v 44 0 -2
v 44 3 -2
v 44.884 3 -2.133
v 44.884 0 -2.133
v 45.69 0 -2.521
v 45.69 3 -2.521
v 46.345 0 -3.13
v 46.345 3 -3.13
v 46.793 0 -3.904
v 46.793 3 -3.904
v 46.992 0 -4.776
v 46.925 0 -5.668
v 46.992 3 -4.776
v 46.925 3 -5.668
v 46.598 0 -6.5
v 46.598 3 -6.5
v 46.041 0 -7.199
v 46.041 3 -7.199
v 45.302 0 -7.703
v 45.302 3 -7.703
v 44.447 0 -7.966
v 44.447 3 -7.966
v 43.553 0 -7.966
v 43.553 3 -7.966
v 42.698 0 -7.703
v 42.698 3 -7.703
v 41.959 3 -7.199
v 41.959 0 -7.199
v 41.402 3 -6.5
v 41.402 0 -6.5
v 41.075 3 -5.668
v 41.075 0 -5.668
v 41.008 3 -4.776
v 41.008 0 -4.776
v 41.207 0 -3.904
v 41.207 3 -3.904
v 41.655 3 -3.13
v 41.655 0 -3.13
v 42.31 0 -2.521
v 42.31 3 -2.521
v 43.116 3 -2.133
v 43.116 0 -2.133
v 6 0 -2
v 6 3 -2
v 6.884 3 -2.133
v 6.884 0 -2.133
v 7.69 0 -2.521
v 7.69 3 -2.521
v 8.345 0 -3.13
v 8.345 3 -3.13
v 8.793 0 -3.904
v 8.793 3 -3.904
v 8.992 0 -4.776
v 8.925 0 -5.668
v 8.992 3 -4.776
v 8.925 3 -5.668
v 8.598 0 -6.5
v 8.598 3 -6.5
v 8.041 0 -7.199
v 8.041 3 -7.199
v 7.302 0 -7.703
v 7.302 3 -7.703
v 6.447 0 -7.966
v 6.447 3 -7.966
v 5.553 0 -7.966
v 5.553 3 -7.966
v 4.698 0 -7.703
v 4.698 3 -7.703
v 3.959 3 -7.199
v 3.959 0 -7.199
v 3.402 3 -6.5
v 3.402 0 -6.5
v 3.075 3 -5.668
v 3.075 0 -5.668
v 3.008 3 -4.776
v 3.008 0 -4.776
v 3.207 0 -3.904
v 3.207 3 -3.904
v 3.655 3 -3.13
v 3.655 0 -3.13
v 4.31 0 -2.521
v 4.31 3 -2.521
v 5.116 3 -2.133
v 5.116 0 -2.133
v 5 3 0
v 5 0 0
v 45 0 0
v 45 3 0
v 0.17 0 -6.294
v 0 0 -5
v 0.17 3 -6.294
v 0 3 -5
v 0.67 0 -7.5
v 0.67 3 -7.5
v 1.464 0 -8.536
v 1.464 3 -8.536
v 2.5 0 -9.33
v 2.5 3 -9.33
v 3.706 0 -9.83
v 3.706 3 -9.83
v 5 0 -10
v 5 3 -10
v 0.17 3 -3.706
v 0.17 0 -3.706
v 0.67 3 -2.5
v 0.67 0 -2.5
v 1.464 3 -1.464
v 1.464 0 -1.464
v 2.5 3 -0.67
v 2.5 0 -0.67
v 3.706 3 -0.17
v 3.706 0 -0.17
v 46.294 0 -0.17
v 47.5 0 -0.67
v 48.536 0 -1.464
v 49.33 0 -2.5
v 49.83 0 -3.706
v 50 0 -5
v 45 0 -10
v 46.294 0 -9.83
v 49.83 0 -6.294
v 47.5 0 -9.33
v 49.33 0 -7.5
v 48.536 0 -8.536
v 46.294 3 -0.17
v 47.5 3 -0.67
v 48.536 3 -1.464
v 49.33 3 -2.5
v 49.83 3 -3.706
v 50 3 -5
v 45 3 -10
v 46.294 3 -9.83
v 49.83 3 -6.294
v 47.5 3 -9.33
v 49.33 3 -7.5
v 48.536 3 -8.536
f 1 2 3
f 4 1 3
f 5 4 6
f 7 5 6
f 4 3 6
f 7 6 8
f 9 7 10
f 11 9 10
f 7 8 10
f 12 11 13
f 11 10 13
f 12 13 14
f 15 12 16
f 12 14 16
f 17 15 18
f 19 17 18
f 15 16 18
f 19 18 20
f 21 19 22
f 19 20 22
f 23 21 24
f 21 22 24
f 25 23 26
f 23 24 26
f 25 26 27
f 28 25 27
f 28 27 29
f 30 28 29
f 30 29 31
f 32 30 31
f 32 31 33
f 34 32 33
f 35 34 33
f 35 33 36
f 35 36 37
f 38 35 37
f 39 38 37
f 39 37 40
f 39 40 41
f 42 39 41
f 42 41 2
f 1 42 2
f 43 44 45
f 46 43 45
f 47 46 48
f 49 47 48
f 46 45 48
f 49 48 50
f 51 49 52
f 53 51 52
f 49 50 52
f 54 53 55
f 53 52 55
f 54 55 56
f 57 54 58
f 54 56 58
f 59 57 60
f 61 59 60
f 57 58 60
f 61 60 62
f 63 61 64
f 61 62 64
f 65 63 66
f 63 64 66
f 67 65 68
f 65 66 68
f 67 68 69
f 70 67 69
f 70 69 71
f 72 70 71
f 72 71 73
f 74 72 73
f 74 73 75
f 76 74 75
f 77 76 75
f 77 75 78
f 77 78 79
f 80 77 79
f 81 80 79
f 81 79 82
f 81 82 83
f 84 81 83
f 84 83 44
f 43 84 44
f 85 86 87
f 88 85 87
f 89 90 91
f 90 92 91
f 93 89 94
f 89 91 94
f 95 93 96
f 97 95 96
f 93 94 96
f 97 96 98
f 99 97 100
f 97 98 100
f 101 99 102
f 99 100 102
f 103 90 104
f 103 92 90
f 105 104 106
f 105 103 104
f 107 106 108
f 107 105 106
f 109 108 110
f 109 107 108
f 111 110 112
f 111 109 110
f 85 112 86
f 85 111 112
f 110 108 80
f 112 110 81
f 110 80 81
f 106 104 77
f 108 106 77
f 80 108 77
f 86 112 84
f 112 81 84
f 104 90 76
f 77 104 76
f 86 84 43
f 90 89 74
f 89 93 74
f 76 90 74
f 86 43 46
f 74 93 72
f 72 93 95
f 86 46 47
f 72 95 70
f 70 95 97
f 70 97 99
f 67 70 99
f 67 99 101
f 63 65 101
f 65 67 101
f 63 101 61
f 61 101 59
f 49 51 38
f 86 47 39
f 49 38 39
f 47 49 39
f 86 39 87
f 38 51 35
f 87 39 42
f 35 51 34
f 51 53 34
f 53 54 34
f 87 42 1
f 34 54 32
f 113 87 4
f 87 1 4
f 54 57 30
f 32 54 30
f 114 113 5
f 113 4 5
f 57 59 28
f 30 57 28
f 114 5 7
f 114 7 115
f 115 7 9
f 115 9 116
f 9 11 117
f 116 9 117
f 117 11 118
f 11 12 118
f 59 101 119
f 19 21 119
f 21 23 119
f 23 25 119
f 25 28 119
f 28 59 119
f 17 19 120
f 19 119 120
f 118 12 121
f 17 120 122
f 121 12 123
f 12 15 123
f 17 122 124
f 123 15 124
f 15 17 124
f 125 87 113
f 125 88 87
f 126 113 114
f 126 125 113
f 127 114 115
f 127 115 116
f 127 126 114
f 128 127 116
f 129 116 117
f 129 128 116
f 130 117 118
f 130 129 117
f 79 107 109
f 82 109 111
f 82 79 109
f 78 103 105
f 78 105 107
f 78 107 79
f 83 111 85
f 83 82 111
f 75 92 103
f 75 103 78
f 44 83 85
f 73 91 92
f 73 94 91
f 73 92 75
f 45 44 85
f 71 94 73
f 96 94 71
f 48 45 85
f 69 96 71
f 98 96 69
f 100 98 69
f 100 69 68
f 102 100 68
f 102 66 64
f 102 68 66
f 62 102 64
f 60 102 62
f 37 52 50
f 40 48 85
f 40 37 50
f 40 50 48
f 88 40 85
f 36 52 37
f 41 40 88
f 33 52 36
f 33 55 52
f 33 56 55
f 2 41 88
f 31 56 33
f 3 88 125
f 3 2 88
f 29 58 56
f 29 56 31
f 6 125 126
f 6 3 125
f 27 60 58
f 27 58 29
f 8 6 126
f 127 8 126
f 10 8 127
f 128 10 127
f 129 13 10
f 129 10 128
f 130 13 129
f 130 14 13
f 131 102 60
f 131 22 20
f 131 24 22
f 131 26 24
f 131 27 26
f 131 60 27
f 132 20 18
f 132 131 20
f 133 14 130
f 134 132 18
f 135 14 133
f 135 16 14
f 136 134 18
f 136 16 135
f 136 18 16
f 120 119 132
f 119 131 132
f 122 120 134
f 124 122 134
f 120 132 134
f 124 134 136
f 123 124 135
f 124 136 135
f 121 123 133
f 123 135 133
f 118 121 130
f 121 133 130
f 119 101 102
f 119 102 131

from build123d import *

# Parameters (mm, degrees)
SKETCH2_W           = 50
SKETCH2_H           = 10
BOSS_EXTRUDE1_DEPTH = 3
FILLET1_R           = 5
FILLET2_R           = 5
SKETCH9_R           = 3
CUT_EXTRUDE2_DEPTH  = 52.078371156
SKETCH10_R          = 3
CUT_EXTRUDE3_DEPTH  = 52.078371156


with BuildPart() as part:
    # Sketch2 → Boss-Extrude1 (new body)
    with BuildSketch(Plane(origin=(0, 0, 0), x_dir=(1, 0, 0), z_dir=(0, 1, 0))):
        with Locations((25, 5)):
            Rectangle(SKETCH2_W, SKETCH2_H)
    extrude(amount=BOSS_EXTRUDE1_DEPTH)

    # Fillet1
    fillet1_edges = [part.edges().sort_by_distance(p)[0] for p in [
        (0, 1.5, -10),
        (0, 1.5, 0),
    ]]
    fillet(fillet1_edges, radius=FILLET1_R - 0.0001)  # a hair under: the kernel refuses the full size

    # Fillet2
    fillet2_edges = [part.edges().sort_by_distance(p)[0] for p in [
        (50, 1.5, -10),
        (50, 1.5, 0),
    ]]
    fillet(fillet2_edges, radius=FILLET2_R - 0.0001)  # a hair under: the kernel refuses the full size

    # Sketch9 → Cut-Extrude2 (cut, through all)
    with BuildSketch(Plane(origin=(0, 3, 0), x_dir=(1, 0, 0), z_dir=(0, 1, 0))):
        with Locations(Location((6, 5, 0), (0, 0, 270))):
            Circle(SKETCH9_R)
    extrude(amount=-CUT_EXTRUDE2_DEPTH, mode=Mode.SUBTRACT)

    # Sketch10 → Cut-Extrude3 (cut, through all)
    with BuildSketch(Plane(origin=(0, 3, 0), x_dir=(1, 0, 0), z_dir=(0, 1, 0))):
        with Locations(Location((44, 5, 0), (0, 0, 270))):
            Circle(SKETCH10_R)
    extrude(amount=-CUT_EXTRUDE3_DEPTH, mode=Mode.SUBTRACT)


solid = part.part
